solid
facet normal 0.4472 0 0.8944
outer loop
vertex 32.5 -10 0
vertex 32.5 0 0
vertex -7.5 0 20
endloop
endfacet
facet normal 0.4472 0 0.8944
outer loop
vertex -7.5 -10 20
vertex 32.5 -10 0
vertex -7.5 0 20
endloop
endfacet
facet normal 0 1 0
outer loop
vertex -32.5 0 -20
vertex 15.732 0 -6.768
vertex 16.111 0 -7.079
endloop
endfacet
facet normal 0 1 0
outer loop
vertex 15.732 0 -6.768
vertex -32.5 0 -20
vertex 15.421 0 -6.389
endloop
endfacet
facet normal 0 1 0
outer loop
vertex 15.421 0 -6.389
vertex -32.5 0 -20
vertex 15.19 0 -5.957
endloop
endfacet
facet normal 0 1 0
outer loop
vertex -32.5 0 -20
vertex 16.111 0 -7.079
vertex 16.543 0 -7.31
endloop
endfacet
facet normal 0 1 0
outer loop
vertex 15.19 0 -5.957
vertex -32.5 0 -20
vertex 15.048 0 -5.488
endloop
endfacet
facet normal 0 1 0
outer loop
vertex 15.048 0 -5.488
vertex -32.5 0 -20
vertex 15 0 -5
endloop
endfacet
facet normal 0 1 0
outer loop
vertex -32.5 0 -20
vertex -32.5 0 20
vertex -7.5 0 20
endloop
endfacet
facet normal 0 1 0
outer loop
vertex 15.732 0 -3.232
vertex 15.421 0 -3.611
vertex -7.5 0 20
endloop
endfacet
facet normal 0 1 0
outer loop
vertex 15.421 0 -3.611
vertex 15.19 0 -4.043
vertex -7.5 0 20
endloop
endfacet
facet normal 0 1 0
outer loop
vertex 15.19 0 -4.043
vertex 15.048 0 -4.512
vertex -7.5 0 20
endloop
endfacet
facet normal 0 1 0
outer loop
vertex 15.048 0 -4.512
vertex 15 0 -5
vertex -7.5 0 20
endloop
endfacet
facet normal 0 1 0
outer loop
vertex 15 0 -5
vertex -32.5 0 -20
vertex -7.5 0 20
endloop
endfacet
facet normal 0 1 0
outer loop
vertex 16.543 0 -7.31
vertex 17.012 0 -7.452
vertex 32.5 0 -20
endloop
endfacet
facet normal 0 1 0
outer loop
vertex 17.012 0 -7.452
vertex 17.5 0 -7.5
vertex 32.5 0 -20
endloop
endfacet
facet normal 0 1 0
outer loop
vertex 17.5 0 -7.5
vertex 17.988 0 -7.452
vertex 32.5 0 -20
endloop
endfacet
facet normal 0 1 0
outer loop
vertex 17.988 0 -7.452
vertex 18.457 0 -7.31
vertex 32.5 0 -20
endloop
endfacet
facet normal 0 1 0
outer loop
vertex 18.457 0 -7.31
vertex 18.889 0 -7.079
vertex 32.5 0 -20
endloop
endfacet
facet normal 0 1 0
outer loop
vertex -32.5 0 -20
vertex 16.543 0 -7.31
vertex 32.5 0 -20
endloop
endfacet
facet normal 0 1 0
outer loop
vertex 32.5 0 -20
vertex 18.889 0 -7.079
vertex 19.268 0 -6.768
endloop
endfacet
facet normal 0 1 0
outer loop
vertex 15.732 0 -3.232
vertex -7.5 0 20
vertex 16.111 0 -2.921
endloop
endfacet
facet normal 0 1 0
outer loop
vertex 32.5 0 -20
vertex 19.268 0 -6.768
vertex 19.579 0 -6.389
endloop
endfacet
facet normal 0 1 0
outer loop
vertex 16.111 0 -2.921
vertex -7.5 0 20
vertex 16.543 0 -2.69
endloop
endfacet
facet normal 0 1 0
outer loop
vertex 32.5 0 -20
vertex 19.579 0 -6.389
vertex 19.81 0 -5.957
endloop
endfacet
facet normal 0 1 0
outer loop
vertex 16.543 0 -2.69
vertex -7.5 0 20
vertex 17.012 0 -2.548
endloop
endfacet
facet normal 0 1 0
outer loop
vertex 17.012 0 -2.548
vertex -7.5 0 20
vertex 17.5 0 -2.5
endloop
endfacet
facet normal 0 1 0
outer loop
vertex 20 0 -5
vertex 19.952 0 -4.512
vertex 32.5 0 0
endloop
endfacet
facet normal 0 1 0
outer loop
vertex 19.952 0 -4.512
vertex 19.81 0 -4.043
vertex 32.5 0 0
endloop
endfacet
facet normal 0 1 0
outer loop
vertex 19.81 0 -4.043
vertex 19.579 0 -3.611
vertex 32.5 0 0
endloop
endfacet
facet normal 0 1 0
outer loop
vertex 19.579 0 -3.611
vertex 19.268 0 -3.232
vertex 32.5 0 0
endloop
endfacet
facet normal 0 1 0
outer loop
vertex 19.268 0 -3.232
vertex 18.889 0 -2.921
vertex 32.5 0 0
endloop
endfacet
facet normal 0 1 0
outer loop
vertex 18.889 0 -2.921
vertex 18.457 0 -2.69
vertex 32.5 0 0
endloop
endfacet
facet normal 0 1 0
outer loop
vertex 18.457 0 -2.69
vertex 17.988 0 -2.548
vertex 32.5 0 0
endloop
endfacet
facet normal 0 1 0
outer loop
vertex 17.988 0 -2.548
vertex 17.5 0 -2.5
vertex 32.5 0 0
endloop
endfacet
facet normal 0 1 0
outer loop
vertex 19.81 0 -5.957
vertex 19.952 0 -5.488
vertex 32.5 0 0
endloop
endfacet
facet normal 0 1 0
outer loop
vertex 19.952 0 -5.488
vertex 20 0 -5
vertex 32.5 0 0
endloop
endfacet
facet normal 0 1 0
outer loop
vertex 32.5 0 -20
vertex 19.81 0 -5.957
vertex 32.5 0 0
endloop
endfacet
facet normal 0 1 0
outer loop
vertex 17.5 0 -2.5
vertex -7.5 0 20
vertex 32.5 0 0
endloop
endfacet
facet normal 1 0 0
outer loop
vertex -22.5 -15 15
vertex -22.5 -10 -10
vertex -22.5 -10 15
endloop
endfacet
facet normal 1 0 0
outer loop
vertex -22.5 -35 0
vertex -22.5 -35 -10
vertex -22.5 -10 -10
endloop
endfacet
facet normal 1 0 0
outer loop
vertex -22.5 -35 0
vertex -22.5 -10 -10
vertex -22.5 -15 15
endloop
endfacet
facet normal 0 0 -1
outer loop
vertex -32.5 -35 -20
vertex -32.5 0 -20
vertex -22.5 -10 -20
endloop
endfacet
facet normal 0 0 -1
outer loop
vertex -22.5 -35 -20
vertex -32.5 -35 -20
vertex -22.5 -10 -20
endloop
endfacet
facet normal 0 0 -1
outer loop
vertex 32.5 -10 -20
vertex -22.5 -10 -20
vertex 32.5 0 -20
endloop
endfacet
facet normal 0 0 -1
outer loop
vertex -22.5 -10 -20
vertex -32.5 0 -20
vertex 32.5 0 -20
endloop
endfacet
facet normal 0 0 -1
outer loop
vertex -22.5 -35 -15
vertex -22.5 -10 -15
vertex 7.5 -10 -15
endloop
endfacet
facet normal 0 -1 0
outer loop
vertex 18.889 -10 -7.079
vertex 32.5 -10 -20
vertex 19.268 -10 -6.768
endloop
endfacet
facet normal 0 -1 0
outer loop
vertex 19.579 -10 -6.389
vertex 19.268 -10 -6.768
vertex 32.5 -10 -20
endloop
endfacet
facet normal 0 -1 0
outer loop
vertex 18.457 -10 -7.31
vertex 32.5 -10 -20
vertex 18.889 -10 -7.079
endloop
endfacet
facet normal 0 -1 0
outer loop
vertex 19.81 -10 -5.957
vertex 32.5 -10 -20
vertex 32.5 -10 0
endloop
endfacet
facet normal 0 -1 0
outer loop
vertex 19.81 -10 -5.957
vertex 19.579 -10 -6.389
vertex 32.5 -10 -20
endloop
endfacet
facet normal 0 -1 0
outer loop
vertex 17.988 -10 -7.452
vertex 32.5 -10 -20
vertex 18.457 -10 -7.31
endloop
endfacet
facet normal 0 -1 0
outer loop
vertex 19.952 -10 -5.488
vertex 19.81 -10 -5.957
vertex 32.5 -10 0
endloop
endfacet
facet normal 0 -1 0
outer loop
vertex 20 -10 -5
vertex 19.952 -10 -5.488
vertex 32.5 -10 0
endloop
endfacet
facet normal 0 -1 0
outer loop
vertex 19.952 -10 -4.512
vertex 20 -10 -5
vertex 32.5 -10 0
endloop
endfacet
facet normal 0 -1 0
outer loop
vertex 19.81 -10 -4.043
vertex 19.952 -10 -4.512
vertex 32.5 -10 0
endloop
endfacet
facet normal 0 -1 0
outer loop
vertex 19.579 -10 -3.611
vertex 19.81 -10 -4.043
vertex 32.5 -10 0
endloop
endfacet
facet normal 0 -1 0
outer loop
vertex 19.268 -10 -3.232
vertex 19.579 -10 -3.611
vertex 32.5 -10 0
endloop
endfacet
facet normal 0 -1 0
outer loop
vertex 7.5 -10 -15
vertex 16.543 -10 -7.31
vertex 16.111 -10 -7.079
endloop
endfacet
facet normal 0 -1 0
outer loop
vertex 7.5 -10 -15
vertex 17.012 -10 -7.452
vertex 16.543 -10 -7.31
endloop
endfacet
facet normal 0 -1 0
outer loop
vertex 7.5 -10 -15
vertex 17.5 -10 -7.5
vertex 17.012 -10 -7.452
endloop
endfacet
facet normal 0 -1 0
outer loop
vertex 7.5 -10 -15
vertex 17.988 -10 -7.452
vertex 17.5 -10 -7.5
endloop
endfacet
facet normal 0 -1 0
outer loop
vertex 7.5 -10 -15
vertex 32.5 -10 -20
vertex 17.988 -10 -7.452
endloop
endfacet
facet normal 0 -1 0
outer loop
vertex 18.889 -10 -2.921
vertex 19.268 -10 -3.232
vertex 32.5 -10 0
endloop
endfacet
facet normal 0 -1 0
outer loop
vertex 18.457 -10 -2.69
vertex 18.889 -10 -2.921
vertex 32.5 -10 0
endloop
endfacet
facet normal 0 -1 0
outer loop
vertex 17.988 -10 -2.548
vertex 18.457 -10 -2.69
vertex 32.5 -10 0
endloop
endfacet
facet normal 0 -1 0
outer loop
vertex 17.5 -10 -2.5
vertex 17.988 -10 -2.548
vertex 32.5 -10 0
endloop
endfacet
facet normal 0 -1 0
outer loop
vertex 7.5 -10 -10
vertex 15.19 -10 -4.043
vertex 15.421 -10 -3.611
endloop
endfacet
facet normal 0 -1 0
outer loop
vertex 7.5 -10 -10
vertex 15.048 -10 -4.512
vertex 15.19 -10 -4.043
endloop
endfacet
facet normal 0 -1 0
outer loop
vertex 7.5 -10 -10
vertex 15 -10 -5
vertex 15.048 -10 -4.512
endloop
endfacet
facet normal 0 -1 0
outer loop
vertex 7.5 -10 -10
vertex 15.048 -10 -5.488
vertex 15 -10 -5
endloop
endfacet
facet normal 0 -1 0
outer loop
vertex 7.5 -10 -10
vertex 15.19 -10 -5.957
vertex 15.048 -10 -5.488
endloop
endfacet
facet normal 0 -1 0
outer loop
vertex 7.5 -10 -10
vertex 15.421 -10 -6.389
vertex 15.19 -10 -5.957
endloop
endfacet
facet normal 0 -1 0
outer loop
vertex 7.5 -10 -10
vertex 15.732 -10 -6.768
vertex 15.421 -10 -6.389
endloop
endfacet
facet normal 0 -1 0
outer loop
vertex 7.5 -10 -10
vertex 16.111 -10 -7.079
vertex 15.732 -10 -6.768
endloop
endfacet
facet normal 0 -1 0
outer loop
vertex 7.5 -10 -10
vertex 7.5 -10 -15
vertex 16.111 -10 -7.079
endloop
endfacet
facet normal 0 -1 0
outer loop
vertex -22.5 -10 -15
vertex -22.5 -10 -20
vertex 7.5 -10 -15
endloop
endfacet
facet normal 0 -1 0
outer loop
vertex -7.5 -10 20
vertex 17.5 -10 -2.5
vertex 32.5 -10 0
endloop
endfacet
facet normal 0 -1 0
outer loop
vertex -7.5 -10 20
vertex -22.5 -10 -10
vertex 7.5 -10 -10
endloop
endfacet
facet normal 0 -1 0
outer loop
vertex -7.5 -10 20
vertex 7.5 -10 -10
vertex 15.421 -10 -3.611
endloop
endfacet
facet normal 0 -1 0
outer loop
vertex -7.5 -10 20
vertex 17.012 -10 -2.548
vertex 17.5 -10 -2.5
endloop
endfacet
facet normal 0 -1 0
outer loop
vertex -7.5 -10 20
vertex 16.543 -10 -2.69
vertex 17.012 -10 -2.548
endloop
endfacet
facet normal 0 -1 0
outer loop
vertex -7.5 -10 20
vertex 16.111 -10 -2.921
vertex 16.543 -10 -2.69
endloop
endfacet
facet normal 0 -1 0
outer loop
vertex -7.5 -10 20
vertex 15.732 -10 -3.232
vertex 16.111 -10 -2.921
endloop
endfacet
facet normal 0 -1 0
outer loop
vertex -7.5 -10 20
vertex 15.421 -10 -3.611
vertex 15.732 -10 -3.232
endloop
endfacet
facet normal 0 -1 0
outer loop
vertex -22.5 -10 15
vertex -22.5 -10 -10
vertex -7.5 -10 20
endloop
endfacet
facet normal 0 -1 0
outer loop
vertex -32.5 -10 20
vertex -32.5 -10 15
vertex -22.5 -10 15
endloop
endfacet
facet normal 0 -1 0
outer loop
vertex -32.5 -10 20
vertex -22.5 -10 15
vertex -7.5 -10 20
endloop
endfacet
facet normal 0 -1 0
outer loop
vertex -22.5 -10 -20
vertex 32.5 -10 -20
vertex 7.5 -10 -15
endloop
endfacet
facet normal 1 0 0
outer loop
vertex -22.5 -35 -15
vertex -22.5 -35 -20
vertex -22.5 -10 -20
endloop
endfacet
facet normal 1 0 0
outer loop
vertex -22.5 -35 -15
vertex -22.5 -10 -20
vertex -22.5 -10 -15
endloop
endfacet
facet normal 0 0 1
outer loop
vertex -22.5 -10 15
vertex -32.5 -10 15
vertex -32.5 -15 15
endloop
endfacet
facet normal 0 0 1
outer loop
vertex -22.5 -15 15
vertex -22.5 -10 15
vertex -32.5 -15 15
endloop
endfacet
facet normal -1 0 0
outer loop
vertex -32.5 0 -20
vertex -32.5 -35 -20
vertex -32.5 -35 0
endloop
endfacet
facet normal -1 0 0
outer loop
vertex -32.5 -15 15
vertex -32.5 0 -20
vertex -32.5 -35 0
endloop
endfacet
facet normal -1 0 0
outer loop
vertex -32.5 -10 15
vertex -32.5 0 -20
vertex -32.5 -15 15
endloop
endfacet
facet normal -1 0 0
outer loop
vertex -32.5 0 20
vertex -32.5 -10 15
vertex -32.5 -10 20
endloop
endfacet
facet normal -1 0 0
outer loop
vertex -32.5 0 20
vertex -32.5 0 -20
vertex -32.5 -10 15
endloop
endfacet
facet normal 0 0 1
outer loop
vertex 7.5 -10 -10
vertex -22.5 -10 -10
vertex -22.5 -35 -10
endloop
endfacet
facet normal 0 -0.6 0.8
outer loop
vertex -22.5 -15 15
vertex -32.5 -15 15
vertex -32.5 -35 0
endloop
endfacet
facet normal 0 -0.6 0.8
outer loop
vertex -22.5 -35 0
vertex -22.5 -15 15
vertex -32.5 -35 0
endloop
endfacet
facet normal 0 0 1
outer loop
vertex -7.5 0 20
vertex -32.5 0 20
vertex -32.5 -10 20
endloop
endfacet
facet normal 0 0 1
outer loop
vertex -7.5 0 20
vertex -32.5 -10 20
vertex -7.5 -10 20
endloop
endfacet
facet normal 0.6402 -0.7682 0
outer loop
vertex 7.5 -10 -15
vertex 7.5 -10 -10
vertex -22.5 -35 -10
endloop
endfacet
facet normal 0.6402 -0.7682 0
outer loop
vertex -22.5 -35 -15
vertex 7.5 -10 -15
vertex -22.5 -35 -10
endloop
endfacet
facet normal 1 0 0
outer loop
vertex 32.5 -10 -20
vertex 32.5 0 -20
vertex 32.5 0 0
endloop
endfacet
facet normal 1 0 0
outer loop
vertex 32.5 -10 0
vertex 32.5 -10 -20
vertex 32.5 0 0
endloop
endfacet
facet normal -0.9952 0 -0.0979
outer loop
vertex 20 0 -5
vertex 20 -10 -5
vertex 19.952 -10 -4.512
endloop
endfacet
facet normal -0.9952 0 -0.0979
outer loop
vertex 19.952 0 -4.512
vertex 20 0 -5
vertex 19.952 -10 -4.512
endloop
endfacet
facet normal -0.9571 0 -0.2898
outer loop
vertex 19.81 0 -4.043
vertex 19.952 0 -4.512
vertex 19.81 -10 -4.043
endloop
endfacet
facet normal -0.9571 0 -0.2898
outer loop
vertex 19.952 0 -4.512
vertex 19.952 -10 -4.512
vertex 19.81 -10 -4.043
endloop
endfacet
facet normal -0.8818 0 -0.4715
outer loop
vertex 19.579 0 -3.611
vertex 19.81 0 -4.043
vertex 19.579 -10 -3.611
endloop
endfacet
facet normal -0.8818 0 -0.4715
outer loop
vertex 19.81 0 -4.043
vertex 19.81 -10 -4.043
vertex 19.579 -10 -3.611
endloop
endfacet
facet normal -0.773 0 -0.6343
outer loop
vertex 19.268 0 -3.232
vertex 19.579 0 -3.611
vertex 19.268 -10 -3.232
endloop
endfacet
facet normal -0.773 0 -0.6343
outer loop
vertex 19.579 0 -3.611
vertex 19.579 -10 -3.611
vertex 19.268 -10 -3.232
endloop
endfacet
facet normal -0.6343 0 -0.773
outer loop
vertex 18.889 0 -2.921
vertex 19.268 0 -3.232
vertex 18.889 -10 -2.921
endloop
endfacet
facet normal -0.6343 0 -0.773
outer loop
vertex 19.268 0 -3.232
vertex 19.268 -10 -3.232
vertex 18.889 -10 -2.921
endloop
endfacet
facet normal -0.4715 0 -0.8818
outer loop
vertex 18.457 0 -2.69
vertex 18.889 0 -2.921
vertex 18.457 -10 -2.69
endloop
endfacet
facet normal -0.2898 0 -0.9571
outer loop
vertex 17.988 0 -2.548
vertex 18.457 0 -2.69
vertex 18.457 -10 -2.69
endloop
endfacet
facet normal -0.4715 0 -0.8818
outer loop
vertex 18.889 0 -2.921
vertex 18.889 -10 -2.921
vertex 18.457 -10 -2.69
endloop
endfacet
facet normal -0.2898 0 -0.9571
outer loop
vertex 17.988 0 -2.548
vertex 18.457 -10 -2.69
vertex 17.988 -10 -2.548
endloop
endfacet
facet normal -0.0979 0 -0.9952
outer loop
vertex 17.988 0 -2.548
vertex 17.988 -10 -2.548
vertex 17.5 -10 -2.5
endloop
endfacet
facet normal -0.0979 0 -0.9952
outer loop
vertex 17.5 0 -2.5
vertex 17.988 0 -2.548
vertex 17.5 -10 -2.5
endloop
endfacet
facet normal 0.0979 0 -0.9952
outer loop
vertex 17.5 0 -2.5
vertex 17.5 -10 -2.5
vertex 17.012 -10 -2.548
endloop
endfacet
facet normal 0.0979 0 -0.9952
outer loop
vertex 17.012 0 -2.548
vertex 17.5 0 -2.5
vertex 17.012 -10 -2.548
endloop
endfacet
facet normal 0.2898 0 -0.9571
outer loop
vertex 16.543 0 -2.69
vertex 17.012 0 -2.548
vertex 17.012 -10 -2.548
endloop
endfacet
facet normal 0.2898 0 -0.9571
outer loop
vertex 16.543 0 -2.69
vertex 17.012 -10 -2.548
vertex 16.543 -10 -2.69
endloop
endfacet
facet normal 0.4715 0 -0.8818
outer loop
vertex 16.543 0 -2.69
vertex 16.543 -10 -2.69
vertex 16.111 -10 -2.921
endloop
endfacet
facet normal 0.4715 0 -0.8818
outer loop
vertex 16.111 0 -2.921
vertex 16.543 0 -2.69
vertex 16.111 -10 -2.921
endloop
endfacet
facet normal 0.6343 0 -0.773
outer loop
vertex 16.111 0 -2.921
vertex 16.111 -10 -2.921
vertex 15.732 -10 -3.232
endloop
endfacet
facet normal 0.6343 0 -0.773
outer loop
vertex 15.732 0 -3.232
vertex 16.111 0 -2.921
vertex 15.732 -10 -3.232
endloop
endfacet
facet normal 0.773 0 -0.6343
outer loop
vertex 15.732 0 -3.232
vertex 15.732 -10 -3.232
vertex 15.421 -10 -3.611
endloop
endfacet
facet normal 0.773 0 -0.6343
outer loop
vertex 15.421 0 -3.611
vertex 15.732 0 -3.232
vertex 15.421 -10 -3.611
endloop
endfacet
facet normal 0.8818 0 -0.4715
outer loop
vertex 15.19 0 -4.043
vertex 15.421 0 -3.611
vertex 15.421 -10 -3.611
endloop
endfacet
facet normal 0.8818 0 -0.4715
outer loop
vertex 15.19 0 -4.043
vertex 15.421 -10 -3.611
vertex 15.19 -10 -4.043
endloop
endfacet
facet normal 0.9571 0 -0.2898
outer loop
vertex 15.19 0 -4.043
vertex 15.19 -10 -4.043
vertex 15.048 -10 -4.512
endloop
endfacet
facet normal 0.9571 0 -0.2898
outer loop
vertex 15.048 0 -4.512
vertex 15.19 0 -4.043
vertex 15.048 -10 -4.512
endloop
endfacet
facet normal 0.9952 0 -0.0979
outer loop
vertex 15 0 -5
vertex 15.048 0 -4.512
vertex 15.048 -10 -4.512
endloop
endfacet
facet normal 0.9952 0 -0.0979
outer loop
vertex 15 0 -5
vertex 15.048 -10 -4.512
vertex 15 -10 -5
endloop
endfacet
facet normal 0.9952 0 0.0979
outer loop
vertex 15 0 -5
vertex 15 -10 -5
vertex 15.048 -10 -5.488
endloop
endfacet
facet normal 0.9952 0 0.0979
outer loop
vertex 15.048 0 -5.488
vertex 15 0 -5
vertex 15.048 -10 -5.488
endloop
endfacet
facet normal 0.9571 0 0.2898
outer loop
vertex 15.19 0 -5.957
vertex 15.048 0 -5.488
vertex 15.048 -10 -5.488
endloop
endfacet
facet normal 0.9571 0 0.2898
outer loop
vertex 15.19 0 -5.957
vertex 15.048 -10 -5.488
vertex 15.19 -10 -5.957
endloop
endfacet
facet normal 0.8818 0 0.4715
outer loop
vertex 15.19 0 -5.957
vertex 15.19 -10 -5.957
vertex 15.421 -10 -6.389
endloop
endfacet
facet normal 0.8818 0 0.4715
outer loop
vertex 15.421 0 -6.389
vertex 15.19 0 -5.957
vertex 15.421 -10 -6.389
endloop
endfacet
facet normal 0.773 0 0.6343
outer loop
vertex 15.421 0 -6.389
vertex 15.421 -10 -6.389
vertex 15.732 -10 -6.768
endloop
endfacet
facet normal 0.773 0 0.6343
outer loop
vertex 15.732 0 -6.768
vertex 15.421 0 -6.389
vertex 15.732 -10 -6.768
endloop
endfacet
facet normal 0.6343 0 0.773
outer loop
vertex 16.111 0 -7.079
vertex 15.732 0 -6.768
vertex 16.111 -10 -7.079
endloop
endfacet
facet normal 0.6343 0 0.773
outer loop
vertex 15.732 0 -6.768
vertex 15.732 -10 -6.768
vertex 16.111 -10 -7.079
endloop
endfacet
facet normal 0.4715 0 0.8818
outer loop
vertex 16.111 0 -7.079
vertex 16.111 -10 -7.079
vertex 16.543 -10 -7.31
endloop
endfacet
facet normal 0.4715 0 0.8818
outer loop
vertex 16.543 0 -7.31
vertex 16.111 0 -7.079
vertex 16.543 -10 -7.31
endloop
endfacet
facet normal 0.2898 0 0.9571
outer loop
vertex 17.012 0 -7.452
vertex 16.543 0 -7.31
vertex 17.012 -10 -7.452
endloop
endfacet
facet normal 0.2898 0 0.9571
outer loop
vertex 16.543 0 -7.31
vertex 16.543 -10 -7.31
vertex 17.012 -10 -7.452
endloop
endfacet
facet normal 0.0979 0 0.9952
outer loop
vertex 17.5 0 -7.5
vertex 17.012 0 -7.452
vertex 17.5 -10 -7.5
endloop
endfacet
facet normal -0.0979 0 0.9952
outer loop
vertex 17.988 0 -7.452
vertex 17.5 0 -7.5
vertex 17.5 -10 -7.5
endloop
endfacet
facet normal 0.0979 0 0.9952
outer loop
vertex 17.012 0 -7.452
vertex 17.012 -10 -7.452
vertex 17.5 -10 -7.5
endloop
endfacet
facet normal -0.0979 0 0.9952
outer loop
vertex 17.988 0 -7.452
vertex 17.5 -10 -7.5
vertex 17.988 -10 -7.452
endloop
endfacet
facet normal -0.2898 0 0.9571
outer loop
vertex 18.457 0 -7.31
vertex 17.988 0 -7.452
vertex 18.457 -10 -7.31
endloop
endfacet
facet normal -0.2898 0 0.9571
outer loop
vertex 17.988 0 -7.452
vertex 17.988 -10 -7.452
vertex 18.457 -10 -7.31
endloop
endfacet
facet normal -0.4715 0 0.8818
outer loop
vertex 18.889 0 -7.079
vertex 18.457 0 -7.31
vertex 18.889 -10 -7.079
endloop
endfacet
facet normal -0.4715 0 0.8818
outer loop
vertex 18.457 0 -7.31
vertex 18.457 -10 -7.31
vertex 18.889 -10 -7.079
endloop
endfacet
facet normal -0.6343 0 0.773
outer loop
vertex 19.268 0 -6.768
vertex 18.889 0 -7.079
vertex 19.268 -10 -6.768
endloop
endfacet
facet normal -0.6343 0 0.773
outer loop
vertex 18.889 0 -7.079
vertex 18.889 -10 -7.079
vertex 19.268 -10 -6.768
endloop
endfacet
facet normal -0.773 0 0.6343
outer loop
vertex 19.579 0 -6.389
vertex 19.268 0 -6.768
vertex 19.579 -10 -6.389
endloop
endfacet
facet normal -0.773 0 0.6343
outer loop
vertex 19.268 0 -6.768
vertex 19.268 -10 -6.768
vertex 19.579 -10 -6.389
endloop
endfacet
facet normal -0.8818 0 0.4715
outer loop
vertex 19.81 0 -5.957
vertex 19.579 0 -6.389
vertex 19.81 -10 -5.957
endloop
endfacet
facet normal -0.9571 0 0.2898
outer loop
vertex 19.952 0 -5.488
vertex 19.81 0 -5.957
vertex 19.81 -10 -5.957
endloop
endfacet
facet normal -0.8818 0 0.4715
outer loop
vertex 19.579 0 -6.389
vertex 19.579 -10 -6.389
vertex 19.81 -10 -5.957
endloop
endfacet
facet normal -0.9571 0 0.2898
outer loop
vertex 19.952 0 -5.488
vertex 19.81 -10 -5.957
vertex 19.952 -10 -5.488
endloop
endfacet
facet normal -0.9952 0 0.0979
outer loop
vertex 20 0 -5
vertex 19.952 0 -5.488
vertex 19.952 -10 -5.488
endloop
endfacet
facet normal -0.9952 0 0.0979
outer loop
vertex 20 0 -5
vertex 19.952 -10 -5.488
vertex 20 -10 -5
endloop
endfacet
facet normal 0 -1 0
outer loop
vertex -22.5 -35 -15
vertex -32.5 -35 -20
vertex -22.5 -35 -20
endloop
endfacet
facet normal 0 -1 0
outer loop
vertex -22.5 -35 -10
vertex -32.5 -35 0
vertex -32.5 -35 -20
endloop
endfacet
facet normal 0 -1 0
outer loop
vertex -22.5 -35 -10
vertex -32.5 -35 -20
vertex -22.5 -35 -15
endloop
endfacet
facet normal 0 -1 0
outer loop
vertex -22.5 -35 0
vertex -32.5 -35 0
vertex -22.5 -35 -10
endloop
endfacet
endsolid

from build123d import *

# Parameters (mm, degrees)
F0_W      = 65
F0_H      = 40
F1_DEPTH  = 35
F2_W      = 55
F2_H      = 40
F3_DEPTH  = 25
F4_W      = 5
F4_H      = 5
F5_DEPTH  = 65.001
F6_R      = 2.5
F7_DEPTH  = 10.001
F9_DEPTH  = 65.001
F11_DEPTH = 35.001
F12_W     = 30
F12_H     = 5
F13_DEPTH = 25
F15_DEPTH = 10.001


with BuildPart() as f1:
    # F0 (on Front) → F1 (new body)
    with BuildSketch(Plane.XZ):
        Rectangle(F0_W, F0_H)
    extrude(amount=F1_DEPTH)

    # F2 (on face) → F3 (cut)
    with BuildSketch(Plane.XZ.offset(35)):
        with Locations((5, 0)):
            Rectangle(F2_W, F2_H)
    extrude(amount=-F3_DEPTH, mode=Mode.SUBTRACT)

    # F4 (on face) → F5 (cut, through all)
    with BuildSketch(Plane(origin=(-32.5, 0, 0), x_dir=(0, -1, 0), z_dir=(-1, 0, 0))):
        with Locations((12.5, 17.5)):
            Rectangle(F4_W, F4_H)
    extrude(amount=-F5_DEPTH, mode=Mode.SUBTRACT)

    # F6 (on face) → F7 (cut, through all)
    with BuildSketch(Plane.XZ.offset(10)):
        with Locations((17.5, -5)):
            Circle(F6_R)
    extrude(amount=-F7_DEPTH, mode=Mode.SUBTRACT)

    # F8 (on face) → F9 (cut, through all)
    with BuildSketch(Plane(origin=(-32.5, 0, 0), x_dir=(0, -1, 0), z_dir=(-1, 0, 0))):
        Polygon((15, 20), (15, 15), (35, 0), (35, 20), align=None)
    extrude(amount=-F9_DEPTH, mode=Mode.SUBTRACT)

    # F10 (on face) → F11 (cut, through all)
    with BuildSketch(Plane(origin=(0, 0, 0), x_dir=(-1, 0, 0), z_dir=(0, 1, 0))):
        Polygon((7.5, 20), (-32.5, 20), (-32.5, 0), align=None)
    extrude(amount=-F11_DEPTH, mode=Mode.SUBTRACT)

    # F12 (on face) → F13 (join)
    with BuildSketch(Plane.XZ.offset(10)):
        with Locations((-7.5, -12.5)):
            Rectangle(F12_W, F12_H)
    extrude(amount=F13_DEPTH)

    # F14 (on face) → F15 (cut, through all)
    with BuildSketch(Plane.XY.offset(-10)):
        Polygon((7.5, -10), (-22.5, -35), (7.5, -35), align=None)
    extrude(amount=-F15_DEPTH, mode=Mode.SUBTRACT)


solid = f1.part
